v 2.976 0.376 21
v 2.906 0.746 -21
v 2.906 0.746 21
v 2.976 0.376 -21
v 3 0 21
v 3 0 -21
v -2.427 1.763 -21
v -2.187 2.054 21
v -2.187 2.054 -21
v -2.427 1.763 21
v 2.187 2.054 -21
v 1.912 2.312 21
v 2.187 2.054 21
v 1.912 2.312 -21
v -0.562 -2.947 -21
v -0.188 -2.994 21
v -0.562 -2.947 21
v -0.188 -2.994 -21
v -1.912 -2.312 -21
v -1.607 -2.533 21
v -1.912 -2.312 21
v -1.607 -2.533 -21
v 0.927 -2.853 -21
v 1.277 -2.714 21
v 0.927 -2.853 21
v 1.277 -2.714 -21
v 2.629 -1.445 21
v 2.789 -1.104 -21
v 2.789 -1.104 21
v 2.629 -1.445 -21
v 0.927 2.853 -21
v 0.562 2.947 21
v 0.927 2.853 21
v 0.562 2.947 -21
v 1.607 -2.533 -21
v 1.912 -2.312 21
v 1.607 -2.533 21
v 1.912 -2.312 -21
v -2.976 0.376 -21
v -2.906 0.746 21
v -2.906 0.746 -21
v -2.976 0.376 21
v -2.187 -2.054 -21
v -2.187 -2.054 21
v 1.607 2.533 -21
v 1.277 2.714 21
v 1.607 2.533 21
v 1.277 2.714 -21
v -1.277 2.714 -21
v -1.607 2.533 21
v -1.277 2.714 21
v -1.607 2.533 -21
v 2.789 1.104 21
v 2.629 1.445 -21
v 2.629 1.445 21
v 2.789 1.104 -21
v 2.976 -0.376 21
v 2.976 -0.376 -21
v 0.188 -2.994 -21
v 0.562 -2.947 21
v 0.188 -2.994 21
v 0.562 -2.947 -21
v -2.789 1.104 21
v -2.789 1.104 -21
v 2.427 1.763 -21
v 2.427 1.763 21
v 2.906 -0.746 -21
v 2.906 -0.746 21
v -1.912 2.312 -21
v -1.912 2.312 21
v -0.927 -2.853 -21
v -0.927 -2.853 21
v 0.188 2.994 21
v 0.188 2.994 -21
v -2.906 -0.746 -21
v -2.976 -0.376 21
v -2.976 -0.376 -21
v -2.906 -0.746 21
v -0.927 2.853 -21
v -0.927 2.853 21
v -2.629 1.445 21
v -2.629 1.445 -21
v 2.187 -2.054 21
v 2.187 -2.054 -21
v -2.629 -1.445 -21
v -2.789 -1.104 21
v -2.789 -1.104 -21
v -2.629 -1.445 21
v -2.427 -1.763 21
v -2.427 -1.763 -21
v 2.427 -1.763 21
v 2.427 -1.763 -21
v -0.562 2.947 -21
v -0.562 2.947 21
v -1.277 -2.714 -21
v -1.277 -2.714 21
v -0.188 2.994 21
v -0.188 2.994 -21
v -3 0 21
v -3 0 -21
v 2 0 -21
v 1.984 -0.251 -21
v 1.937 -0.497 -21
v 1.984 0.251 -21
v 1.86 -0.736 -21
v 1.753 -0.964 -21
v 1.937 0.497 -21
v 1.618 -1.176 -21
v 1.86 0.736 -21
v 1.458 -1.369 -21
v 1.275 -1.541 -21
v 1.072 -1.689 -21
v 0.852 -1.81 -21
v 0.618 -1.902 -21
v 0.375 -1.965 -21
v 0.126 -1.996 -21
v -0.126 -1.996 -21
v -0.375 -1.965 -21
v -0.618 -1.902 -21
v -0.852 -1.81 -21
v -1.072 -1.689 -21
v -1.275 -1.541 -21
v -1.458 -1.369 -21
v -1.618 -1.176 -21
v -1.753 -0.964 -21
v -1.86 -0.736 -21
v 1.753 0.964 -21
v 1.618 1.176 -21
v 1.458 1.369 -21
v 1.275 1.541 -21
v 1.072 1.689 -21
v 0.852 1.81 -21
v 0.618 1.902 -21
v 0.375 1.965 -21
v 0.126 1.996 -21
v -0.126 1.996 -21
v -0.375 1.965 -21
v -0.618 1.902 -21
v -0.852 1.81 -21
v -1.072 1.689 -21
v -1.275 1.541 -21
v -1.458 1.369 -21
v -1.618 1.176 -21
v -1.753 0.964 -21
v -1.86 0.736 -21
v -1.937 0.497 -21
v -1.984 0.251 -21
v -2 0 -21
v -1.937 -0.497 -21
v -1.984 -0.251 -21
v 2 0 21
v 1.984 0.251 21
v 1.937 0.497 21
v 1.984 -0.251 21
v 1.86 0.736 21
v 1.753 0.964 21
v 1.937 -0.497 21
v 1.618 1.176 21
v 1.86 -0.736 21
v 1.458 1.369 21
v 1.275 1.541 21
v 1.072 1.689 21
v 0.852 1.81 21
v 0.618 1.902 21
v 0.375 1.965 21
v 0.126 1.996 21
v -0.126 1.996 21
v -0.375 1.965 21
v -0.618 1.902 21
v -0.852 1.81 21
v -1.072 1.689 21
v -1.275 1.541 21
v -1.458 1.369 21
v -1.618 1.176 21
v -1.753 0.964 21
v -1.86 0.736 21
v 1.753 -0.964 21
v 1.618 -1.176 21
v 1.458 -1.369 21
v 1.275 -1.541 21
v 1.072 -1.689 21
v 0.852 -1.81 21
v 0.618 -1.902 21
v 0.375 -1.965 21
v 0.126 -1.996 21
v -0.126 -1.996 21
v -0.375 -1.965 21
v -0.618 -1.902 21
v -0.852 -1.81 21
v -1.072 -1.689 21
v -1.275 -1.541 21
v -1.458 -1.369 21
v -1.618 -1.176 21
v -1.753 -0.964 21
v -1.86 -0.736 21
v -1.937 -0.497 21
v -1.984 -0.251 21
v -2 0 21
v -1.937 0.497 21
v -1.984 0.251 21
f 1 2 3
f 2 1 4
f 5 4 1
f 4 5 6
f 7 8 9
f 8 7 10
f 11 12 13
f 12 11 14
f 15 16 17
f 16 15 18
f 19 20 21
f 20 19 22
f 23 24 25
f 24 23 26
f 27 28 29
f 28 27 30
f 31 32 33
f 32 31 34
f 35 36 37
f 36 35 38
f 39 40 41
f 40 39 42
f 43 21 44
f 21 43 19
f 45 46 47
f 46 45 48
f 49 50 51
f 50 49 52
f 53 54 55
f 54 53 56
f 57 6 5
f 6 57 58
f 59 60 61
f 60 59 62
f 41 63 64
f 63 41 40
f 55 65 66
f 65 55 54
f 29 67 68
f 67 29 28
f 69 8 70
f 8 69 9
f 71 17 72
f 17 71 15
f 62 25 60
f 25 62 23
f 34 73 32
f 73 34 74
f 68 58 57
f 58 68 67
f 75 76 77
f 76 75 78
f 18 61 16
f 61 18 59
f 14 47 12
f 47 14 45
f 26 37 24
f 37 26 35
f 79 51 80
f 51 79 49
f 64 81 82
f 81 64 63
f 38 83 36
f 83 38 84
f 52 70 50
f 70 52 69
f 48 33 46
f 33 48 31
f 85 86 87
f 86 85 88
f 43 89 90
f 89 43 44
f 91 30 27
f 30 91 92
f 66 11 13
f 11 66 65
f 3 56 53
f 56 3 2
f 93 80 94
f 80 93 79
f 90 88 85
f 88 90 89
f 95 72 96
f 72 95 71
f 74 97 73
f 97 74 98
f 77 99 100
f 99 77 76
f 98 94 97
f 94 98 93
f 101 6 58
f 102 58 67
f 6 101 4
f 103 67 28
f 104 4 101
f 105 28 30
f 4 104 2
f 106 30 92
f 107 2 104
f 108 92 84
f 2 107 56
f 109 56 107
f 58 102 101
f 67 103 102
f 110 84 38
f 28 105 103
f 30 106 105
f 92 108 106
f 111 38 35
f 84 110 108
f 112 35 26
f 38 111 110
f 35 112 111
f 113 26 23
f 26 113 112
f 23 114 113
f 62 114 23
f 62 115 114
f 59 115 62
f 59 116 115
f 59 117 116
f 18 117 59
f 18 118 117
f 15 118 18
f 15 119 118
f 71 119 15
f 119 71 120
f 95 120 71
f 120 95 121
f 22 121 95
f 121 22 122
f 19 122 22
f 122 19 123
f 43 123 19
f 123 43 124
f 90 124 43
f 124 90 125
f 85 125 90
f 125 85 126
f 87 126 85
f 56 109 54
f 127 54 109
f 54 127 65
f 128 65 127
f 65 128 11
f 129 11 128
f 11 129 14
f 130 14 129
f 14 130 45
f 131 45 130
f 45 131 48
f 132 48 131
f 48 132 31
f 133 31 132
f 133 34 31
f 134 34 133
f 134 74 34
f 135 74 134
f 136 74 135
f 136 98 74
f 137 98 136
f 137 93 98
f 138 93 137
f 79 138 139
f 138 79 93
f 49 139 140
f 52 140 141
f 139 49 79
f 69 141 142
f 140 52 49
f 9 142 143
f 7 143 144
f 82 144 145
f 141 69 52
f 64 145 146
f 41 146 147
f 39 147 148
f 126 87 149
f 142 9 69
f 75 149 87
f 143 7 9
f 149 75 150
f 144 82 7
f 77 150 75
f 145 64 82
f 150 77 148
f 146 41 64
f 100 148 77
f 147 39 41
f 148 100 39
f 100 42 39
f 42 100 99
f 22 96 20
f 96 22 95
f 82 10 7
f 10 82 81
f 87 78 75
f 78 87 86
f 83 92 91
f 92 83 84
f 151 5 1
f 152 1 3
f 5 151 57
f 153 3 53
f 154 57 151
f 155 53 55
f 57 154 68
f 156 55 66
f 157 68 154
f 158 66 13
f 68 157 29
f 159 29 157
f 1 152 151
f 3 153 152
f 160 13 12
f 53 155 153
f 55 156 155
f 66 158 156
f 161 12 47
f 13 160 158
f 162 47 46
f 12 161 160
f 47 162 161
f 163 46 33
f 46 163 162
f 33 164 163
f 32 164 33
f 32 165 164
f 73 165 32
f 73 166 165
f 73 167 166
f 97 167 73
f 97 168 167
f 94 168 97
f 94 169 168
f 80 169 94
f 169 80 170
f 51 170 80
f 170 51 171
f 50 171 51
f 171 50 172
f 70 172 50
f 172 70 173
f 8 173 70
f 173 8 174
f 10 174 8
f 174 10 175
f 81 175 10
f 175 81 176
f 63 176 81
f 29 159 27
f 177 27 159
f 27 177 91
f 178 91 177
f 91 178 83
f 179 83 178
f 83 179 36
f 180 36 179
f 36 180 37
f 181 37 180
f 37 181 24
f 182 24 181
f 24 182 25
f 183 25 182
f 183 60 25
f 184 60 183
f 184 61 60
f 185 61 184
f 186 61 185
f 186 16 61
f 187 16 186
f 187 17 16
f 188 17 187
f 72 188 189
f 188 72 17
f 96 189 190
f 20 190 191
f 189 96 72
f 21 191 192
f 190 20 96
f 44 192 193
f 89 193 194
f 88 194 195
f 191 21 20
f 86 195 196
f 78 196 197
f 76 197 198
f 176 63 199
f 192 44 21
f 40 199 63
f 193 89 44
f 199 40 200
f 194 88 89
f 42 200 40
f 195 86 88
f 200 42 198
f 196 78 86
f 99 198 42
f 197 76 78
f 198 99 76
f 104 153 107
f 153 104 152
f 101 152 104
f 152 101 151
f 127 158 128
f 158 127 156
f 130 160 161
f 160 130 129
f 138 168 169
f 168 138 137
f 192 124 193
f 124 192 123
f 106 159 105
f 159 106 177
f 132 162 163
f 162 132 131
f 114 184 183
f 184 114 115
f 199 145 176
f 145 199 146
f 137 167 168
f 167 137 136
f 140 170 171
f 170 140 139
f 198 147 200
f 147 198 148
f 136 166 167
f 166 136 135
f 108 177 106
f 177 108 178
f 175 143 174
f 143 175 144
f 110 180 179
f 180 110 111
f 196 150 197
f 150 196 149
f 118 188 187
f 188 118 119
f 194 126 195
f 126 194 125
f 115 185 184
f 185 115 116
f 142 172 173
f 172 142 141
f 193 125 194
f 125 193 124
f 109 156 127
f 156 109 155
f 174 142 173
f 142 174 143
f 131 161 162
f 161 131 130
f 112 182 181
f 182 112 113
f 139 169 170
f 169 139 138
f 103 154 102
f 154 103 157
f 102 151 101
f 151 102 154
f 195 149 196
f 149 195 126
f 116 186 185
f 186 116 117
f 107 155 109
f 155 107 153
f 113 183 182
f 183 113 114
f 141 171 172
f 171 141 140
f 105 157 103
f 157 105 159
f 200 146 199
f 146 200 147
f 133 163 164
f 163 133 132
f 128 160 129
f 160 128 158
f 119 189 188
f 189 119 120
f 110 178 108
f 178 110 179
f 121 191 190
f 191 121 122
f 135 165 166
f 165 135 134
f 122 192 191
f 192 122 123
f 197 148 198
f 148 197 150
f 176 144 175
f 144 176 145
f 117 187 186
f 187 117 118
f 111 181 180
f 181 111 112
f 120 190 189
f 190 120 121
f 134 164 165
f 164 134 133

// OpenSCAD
$fn = 50;


difference() {
	union() {
		translate(v = [0, 0, -21.0000000000]) {
			cylinder(h = 42, r = 3.0000000000);
		}
	}
	union() {
		translate(v = [0, 0, -100.0000000000]) {
			cylinder(h = 200, r = 2.0000000000);
		}
	}
}
